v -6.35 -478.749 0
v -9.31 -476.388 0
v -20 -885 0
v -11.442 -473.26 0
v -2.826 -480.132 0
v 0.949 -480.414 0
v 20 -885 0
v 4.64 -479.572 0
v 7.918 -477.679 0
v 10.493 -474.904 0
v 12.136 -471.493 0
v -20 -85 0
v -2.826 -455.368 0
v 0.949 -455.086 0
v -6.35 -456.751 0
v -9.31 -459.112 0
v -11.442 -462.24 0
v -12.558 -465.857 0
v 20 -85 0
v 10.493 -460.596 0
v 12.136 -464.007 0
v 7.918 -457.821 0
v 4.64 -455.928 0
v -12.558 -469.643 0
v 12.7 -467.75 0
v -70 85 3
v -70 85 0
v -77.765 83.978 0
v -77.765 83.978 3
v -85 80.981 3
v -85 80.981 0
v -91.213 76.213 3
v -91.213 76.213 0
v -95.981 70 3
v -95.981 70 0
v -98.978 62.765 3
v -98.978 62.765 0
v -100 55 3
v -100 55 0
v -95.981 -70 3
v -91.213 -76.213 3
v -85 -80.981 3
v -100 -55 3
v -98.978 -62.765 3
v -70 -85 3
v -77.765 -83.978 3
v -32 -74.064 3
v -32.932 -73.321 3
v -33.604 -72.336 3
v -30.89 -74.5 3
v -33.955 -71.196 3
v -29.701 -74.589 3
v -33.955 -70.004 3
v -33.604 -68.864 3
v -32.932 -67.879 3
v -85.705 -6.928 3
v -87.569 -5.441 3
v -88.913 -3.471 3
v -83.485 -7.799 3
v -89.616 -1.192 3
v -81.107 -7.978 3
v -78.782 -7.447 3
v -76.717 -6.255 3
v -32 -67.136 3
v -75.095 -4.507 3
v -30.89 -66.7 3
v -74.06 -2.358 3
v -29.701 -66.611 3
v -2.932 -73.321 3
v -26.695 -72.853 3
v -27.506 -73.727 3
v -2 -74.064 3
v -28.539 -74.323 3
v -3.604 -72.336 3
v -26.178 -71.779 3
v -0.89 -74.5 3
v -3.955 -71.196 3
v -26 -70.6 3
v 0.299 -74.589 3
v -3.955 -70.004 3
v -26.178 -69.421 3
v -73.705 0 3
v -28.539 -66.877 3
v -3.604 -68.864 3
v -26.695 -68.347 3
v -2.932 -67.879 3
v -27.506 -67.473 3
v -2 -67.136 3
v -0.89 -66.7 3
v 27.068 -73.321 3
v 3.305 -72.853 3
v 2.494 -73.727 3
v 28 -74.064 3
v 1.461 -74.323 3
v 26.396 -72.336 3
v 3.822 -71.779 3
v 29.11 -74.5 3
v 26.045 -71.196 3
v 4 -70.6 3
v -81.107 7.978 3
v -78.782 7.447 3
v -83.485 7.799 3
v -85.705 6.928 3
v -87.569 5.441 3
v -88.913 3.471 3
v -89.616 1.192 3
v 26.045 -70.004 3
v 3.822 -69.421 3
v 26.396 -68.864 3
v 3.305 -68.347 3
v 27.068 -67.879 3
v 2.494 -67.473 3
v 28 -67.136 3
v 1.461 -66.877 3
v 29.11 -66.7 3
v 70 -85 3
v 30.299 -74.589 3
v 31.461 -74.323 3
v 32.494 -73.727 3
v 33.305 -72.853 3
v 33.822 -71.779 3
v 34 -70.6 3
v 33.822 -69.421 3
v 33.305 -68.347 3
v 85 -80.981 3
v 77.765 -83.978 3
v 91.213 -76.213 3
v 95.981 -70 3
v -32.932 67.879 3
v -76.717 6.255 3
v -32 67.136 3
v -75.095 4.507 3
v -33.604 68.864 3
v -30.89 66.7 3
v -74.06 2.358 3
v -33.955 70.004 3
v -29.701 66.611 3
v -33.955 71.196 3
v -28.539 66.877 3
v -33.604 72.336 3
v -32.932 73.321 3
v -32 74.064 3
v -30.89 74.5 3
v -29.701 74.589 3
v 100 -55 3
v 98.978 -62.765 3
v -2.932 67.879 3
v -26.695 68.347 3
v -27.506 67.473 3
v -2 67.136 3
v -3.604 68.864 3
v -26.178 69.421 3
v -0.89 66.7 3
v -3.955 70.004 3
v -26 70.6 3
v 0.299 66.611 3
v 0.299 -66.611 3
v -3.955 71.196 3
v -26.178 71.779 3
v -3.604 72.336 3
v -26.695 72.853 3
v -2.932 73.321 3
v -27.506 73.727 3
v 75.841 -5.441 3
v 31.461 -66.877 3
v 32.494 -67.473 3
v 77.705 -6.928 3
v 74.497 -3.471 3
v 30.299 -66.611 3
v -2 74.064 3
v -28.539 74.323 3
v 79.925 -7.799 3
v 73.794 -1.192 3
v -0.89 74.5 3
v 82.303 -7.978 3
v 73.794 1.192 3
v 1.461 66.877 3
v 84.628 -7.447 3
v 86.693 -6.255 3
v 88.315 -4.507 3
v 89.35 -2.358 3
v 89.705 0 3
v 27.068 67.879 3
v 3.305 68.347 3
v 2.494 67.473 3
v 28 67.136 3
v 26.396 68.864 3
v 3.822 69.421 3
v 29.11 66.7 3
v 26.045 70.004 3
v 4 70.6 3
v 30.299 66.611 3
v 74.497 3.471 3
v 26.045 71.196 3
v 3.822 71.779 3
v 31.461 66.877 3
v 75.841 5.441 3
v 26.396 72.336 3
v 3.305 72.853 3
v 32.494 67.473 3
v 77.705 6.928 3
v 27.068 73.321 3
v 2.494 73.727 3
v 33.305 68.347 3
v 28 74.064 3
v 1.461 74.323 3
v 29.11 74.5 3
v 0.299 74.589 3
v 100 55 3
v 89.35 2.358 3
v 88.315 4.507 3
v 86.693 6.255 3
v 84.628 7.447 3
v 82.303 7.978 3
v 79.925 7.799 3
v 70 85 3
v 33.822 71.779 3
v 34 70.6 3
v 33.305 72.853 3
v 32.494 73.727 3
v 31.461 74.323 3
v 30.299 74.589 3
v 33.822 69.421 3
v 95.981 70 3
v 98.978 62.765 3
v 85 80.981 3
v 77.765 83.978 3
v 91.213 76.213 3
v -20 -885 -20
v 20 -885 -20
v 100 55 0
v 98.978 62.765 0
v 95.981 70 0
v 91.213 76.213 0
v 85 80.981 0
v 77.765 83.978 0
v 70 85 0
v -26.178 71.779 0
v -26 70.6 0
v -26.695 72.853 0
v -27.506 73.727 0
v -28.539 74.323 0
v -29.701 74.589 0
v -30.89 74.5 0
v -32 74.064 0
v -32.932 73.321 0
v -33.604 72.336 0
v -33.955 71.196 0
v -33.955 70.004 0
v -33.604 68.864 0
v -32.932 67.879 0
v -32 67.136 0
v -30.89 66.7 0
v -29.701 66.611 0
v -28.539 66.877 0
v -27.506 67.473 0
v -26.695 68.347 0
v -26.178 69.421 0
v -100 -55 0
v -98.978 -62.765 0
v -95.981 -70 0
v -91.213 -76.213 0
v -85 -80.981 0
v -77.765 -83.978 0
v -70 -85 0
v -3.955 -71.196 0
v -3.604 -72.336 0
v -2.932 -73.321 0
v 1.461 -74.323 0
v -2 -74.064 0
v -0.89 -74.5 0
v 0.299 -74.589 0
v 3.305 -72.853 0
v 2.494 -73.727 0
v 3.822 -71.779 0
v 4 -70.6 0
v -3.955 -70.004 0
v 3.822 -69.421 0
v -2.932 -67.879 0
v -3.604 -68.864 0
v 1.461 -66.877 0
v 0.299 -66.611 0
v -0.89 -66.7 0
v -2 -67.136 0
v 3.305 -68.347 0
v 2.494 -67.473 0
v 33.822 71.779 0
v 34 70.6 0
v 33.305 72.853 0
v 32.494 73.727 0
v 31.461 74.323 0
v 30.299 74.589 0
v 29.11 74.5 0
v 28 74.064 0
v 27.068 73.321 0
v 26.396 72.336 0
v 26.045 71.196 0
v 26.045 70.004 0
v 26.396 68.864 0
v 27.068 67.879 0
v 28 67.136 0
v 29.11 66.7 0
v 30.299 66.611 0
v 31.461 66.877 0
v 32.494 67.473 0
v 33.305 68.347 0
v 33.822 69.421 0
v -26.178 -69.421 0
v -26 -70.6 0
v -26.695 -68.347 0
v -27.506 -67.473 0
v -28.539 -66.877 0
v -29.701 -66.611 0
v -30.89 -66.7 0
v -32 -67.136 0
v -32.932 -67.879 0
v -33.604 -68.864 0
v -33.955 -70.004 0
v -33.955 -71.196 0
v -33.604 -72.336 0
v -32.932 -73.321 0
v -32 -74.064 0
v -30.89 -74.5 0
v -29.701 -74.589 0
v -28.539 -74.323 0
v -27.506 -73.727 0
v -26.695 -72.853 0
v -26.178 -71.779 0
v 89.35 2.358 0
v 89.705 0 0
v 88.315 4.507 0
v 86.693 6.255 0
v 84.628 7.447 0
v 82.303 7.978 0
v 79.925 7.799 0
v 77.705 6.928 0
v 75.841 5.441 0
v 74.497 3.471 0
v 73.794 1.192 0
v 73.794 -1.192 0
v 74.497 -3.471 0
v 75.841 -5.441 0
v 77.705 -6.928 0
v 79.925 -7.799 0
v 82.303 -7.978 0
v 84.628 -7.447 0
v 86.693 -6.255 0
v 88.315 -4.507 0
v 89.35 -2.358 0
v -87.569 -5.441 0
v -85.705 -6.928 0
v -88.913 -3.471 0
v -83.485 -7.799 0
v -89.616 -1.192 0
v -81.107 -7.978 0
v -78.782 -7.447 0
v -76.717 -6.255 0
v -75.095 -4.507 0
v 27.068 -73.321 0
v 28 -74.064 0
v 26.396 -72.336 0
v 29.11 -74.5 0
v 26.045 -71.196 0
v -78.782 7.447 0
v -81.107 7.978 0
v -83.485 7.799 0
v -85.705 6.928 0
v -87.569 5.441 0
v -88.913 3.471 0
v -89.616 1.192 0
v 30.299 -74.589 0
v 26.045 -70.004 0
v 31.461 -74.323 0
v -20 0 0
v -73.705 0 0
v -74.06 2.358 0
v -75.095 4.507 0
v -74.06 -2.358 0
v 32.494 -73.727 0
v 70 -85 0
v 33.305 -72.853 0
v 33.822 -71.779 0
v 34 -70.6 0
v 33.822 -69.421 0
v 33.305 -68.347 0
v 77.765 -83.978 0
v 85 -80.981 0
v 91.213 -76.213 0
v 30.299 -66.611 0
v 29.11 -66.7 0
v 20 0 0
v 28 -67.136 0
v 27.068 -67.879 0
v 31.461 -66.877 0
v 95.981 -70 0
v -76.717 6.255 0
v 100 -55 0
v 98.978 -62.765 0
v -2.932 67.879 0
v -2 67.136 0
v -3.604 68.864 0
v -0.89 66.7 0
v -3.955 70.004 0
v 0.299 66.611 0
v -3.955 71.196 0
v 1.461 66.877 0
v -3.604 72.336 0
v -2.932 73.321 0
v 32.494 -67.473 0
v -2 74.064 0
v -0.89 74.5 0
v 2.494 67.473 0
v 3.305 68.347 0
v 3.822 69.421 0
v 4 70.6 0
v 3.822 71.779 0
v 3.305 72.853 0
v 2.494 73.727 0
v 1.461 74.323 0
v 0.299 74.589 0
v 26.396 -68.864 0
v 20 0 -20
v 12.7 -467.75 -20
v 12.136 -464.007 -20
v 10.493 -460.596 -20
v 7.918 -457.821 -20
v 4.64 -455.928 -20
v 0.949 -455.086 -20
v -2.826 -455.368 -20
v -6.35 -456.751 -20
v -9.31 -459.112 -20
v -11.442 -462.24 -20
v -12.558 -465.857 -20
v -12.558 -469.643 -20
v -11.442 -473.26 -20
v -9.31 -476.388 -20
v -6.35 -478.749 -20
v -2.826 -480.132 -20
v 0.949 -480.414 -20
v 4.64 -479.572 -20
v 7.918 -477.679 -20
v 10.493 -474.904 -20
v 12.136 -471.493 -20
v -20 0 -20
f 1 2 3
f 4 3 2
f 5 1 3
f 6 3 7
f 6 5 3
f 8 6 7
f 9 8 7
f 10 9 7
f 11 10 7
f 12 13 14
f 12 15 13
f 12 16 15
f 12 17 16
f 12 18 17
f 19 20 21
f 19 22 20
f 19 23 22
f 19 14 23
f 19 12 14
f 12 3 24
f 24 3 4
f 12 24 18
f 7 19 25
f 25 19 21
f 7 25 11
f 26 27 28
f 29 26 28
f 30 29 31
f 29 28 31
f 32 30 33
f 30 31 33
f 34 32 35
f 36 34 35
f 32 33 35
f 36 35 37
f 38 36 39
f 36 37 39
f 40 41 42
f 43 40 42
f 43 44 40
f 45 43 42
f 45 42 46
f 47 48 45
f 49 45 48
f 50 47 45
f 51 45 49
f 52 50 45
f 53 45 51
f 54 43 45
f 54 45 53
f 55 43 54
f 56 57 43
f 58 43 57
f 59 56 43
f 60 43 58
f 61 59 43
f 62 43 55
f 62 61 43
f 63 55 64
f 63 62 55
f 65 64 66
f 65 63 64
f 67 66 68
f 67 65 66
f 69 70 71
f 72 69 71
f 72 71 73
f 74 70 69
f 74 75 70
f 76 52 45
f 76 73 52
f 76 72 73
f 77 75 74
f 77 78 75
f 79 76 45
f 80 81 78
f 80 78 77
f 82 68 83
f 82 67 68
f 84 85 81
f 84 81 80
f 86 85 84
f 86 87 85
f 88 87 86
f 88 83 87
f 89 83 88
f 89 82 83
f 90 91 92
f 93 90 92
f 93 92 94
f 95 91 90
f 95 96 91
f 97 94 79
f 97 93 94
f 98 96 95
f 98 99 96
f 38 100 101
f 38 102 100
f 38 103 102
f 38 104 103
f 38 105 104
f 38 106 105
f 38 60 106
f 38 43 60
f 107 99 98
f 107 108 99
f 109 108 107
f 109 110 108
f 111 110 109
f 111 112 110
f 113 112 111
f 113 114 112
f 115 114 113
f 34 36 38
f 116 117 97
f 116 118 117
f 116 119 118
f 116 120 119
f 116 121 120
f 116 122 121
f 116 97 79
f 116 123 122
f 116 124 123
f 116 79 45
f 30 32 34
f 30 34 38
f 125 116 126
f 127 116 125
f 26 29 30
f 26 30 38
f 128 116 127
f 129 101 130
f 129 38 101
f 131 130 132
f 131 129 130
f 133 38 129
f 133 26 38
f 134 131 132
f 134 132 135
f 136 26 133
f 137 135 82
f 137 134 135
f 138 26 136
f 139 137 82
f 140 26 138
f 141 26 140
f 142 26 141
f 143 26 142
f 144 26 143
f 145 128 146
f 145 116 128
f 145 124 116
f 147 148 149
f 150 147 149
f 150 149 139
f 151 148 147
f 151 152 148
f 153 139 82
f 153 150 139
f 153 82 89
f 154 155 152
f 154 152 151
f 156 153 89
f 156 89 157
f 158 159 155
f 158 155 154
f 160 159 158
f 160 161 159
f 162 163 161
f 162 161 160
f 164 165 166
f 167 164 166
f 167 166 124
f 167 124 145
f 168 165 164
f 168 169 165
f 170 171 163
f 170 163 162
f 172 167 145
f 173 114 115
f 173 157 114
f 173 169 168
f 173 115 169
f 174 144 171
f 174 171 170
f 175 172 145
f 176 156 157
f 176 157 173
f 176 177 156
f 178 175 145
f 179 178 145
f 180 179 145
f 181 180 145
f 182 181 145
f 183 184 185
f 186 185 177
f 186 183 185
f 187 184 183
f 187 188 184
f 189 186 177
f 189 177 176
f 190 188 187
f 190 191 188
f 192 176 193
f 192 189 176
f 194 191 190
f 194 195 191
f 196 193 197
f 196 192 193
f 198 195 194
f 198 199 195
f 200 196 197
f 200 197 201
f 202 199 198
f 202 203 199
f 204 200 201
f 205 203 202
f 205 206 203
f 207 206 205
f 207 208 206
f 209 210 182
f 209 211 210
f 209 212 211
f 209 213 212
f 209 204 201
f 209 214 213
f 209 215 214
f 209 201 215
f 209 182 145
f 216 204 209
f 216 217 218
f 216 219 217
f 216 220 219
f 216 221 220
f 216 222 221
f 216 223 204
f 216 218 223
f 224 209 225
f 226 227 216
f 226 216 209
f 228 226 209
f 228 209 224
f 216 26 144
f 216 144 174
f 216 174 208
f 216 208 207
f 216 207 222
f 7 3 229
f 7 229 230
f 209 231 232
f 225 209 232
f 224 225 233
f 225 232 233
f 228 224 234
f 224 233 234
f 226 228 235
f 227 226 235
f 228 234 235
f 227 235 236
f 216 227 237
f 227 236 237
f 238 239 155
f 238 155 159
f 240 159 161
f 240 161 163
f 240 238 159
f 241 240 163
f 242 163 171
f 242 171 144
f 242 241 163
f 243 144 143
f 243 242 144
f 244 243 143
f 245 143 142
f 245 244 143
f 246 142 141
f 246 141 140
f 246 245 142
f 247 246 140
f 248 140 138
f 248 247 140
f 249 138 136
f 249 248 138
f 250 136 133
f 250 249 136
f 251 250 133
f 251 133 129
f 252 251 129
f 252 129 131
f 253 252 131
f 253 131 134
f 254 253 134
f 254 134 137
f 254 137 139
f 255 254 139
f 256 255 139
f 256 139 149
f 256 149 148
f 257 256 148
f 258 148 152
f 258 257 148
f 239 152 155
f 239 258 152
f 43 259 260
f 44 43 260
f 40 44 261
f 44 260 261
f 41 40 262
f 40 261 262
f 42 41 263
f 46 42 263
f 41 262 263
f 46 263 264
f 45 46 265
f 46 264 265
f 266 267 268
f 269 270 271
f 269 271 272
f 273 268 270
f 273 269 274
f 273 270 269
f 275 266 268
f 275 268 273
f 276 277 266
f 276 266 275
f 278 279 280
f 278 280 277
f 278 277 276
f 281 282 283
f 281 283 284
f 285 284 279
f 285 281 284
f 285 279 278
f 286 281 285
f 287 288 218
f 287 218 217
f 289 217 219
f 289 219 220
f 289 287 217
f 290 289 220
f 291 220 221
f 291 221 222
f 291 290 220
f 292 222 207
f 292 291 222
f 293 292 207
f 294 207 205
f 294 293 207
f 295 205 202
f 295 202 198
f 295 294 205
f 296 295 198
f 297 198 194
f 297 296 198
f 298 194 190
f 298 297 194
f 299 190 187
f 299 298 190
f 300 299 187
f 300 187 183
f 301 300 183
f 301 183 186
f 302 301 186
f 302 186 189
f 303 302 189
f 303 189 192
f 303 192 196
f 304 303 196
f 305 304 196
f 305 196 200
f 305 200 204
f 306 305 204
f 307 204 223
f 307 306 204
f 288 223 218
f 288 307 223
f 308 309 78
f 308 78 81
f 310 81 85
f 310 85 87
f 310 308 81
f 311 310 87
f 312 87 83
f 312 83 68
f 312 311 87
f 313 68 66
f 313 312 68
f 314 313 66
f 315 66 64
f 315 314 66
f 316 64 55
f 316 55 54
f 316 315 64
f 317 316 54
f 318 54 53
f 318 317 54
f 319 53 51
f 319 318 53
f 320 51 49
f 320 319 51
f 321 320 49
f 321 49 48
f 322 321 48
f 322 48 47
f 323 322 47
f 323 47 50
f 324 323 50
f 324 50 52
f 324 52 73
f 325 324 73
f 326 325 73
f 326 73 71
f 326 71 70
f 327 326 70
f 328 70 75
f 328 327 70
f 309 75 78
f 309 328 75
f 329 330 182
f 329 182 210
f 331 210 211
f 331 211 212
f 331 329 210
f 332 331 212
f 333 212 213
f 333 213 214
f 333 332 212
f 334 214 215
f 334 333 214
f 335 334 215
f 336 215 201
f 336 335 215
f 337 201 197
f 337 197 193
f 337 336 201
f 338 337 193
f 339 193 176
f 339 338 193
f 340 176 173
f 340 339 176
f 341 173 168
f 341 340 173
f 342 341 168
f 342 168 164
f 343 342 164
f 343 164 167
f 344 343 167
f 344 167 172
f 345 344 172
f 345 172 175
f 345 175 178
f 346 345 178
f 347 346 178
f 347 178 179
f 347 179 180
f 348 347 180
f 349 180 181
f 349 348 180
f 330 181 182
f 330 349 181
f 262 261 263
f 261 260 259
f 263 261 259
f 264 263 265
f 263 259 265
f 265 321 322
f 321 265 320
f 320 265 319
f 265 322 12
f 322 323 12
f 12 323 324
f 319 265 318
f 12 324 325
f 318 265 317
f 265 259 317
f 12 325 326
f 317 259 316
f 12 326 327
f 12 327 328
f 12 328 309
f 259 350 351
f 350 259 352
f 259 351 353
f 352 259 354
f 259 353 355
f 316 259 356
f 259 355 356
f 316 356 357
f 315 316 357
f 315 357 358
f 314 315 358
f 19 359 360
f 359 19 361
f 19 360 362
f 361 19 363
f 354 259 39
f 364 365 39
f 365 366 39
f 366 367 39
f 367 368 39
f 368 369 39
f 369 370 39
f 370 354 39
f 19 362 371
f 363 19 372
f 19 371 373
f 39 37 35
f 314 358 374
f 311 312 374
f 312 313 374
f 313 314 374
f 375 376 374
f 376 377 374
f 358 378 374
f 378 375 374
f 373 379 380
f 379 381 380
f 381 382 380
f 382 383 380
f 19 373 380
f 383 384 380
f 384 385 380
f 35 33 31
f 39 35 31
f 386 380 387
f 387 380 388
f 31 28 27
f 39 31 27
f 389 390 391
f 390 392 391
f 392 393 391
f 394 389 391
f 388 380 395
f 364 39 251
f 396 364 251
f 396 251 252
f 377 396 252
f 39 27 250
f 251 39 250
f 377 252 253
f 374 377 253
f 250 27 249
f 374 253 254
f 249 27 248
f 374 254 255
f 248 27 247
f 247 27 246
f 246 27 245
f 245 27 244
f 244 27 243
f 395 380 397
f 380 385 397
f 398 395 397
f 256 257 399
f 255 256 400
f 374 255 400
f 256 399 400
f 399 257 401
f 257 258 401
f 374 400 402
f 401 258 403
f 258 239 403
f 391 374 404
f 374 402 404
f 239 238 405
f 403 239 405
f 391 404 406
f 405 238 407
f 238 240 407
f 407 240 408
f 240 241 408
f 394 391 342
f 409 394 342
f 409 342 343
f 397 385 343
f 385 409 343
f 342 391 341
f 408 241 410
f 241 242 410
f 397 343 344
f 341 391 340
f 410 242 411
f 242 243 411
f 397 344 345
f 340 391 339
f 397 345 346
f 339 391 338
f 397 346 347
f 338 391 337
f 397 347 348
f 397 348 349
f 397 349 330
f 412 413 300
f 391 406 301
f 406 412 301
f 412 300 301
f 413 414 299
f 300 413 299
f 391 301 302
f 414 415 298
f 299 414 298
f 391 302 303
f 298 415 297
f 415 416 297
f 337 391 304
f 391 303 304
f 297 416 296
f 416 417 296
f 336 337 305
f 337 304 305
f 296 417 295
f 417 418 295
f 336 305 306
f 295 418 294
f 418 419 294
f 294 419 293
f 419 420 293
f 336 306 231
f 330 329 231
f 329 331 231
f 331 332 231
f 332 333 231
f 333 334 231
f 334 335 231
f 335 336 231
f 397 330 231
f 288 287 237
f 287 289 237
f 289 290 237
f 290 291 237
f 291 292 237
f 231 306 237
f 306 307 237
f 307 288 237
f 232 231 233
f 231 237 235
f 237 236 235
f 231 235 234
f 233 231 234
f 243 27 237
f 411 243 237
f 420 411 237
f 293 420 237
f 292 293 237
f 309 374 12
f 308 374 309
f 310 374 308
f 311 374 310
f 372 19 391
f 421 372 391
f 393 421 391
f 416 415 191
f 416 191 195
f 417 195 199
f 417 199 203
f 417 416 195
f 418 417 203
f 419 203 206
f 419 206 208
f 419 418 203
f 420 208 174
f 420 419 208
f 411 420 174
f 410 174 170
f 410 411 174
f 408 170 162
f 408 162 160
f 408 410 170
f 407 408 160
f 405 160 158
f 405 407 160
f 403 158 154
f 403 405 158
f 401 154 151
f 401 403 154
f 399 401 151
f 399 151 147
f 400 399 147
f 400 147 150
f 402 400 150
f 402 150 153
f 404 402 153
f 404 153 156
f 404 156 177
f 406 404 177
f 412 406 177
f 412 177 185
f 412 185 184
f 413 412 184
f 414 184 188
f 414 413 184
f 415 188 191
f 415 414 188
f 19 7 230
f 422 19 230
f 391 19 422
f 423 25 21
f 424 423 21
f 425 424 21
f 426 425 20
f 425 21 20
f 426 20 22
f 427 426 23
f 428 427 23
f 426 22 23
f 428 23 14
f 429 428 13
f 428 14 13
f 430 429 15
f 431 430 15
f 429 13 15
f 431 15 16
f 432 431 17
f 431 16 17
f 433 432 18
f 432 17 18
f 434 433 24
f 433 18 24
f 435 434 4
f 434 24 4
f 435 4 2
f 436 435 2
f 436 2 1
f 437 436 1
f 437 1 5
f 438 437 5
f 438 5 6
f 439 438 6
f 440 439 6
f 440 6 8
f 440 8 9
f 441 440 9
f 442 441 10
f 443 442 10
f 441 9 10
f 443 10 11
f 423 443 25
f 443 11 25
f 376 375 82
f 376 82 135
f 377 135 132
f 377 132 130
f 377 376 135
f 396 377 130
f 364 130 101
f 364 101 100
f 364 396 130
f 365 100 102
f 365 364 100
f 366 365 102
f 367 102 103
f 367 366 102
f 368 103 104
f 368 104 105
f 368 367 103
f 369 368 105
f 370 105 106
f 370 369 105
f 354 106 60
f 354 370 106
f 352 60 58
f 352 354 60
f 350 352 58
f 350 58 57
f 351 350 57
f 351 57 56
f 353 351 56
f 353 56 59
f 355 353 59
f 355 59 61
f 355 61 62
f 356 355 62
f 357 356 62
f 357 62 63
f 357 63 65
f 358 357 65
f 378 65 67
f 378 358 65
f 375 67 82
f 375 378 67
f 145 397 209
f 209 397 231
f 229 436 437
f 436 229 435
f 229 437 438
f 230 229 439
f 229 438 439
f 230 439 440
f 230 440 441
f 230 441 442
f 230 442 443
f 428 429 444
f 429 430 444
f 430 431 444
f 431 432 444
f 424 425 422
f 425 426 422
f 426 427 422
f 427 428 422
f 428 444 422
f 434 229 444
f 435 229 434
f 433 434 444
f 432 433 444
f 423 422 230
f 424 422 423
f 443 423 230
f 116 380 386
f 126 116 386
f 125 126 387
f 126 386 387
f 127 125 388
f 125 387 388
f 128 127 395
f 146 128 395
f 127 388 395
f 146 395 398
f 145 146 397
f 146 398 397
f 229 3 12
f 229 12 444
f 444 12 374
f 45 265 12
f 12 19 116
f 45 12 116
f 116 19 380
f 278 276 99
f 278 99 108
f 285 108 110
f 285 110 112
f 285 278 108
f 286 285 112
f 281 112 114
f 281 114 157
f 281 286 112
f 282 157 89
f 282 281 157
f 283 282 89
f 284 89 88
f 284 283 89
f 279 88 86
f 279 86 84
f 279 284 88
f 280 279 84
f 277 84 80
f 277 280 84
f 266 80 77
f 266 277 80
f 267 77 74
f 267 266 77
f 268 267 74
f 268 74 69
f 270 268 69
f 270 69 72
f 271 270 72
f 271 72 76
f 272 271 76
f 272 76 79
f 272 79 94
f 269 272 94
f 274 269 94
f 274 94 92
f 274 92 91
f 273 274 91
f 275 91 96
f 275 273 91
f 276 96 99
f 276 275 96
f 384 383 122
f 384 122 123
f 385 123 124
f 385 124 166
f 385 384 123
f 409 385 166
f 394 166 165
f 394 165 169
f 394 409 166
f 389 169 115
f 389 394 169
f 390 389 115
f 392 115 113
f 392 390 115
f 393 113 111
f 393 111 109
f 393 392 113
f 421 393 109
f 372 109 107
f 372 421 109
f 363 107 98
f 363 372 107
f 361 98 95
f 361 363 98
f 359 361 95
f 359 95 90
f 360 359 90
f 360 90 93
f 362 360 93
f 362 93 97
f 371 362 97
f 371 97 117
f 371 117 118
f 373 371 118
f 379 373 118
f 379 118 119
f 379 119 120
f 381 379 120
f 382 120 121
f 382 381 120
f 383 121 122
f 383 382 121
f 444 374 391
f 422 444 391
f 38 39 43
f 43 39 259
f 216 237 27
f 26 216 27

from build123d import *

# Parameters (mm, degrees)
CROQUIS1_R              = 8
CROQUIS1_R_2            = 4
SALIENTE_EXTRUIR1_DEPTH = 3
CROQUIS2_W              = 40
CROQUIS2_H              = 885
CROQUIS2_R              = 12.7
SALIENTE_EXTRUIR2_DEPTH = 20


with BuildPart() as part:
    # Croquis1 → Saliente-Extruir1 (new body)
    with BuildSketch(Plane.XY):
        with BuildLine():
            Line((70, 85), (-70, 85))
            ThreePointArc((-70, 85), (-91.213203436, 76.213203436), (-100, 55))
            Line((-100, 55), (-100, -55))
            ThreePointArc((-100, -55), (-91.213203436, -76.213203436), (-70, -85))
            Line((-70, -85), (70, -85))
            ThreePointArc((70, -85), (91.213203436, -76.213203436), (100, -55))
            Line((100, -55), (100, 55))
            ThreePointArc((100, 55), (91.213203436, 76.213203436), (70, 85))
        make_face()
        with Locations((-81.705, 0)):
            Circle(CROQUIS1_R, mode=Mode.SUBTRACT)
        with Locations((81.705, 0)):
            Circle(CROQUIS1_R, mode=Mode.SUBTRACT)
        with Locations((0, 70.6)):
            Circle(CROQUIS1_R_2, mode=Mode.SUBTRACT)
        with Locations((0, -70.6)):
            Circle(CROQUIS1_R_2, mode=Mode.SUBTRACT)
        with Locations((-30, 70.6)):
            Circle(CROQUIS1_R_2, mode=Mode.SUBTRACT)
        with Locations((30, 70.6)):
            Circle(CROQUIS1_R_2, mode=Mode.SUBTRACT)
        with Locations((-30, -70.6)):
            Circle(CROQUIS1_R_2, mode=Mode.SUBTRACT)
        with Locations((30, -70.6)):
            Circle(CROQUIS1_R_2, mode=Mode.SUBTRACT)
    extrude(amount=SALIENTE_EXTRUIR1_DEPTH)

    # Croquis2 → Saliente-Extruir2 (add)
    with BuildSketch(Plane.XY):
        with Locations((0, -442.5)):
            Rectangle(CROQUIS2_W, CROQUIS2_H)
        with Locations((0, -467.75)):
            Circle(CROQUIS2_R, mode=Mode.SUBTRACT)
    extrude(amount=-SALIENTE_EXTRUIR2_DEPTH)


solid = part.part
